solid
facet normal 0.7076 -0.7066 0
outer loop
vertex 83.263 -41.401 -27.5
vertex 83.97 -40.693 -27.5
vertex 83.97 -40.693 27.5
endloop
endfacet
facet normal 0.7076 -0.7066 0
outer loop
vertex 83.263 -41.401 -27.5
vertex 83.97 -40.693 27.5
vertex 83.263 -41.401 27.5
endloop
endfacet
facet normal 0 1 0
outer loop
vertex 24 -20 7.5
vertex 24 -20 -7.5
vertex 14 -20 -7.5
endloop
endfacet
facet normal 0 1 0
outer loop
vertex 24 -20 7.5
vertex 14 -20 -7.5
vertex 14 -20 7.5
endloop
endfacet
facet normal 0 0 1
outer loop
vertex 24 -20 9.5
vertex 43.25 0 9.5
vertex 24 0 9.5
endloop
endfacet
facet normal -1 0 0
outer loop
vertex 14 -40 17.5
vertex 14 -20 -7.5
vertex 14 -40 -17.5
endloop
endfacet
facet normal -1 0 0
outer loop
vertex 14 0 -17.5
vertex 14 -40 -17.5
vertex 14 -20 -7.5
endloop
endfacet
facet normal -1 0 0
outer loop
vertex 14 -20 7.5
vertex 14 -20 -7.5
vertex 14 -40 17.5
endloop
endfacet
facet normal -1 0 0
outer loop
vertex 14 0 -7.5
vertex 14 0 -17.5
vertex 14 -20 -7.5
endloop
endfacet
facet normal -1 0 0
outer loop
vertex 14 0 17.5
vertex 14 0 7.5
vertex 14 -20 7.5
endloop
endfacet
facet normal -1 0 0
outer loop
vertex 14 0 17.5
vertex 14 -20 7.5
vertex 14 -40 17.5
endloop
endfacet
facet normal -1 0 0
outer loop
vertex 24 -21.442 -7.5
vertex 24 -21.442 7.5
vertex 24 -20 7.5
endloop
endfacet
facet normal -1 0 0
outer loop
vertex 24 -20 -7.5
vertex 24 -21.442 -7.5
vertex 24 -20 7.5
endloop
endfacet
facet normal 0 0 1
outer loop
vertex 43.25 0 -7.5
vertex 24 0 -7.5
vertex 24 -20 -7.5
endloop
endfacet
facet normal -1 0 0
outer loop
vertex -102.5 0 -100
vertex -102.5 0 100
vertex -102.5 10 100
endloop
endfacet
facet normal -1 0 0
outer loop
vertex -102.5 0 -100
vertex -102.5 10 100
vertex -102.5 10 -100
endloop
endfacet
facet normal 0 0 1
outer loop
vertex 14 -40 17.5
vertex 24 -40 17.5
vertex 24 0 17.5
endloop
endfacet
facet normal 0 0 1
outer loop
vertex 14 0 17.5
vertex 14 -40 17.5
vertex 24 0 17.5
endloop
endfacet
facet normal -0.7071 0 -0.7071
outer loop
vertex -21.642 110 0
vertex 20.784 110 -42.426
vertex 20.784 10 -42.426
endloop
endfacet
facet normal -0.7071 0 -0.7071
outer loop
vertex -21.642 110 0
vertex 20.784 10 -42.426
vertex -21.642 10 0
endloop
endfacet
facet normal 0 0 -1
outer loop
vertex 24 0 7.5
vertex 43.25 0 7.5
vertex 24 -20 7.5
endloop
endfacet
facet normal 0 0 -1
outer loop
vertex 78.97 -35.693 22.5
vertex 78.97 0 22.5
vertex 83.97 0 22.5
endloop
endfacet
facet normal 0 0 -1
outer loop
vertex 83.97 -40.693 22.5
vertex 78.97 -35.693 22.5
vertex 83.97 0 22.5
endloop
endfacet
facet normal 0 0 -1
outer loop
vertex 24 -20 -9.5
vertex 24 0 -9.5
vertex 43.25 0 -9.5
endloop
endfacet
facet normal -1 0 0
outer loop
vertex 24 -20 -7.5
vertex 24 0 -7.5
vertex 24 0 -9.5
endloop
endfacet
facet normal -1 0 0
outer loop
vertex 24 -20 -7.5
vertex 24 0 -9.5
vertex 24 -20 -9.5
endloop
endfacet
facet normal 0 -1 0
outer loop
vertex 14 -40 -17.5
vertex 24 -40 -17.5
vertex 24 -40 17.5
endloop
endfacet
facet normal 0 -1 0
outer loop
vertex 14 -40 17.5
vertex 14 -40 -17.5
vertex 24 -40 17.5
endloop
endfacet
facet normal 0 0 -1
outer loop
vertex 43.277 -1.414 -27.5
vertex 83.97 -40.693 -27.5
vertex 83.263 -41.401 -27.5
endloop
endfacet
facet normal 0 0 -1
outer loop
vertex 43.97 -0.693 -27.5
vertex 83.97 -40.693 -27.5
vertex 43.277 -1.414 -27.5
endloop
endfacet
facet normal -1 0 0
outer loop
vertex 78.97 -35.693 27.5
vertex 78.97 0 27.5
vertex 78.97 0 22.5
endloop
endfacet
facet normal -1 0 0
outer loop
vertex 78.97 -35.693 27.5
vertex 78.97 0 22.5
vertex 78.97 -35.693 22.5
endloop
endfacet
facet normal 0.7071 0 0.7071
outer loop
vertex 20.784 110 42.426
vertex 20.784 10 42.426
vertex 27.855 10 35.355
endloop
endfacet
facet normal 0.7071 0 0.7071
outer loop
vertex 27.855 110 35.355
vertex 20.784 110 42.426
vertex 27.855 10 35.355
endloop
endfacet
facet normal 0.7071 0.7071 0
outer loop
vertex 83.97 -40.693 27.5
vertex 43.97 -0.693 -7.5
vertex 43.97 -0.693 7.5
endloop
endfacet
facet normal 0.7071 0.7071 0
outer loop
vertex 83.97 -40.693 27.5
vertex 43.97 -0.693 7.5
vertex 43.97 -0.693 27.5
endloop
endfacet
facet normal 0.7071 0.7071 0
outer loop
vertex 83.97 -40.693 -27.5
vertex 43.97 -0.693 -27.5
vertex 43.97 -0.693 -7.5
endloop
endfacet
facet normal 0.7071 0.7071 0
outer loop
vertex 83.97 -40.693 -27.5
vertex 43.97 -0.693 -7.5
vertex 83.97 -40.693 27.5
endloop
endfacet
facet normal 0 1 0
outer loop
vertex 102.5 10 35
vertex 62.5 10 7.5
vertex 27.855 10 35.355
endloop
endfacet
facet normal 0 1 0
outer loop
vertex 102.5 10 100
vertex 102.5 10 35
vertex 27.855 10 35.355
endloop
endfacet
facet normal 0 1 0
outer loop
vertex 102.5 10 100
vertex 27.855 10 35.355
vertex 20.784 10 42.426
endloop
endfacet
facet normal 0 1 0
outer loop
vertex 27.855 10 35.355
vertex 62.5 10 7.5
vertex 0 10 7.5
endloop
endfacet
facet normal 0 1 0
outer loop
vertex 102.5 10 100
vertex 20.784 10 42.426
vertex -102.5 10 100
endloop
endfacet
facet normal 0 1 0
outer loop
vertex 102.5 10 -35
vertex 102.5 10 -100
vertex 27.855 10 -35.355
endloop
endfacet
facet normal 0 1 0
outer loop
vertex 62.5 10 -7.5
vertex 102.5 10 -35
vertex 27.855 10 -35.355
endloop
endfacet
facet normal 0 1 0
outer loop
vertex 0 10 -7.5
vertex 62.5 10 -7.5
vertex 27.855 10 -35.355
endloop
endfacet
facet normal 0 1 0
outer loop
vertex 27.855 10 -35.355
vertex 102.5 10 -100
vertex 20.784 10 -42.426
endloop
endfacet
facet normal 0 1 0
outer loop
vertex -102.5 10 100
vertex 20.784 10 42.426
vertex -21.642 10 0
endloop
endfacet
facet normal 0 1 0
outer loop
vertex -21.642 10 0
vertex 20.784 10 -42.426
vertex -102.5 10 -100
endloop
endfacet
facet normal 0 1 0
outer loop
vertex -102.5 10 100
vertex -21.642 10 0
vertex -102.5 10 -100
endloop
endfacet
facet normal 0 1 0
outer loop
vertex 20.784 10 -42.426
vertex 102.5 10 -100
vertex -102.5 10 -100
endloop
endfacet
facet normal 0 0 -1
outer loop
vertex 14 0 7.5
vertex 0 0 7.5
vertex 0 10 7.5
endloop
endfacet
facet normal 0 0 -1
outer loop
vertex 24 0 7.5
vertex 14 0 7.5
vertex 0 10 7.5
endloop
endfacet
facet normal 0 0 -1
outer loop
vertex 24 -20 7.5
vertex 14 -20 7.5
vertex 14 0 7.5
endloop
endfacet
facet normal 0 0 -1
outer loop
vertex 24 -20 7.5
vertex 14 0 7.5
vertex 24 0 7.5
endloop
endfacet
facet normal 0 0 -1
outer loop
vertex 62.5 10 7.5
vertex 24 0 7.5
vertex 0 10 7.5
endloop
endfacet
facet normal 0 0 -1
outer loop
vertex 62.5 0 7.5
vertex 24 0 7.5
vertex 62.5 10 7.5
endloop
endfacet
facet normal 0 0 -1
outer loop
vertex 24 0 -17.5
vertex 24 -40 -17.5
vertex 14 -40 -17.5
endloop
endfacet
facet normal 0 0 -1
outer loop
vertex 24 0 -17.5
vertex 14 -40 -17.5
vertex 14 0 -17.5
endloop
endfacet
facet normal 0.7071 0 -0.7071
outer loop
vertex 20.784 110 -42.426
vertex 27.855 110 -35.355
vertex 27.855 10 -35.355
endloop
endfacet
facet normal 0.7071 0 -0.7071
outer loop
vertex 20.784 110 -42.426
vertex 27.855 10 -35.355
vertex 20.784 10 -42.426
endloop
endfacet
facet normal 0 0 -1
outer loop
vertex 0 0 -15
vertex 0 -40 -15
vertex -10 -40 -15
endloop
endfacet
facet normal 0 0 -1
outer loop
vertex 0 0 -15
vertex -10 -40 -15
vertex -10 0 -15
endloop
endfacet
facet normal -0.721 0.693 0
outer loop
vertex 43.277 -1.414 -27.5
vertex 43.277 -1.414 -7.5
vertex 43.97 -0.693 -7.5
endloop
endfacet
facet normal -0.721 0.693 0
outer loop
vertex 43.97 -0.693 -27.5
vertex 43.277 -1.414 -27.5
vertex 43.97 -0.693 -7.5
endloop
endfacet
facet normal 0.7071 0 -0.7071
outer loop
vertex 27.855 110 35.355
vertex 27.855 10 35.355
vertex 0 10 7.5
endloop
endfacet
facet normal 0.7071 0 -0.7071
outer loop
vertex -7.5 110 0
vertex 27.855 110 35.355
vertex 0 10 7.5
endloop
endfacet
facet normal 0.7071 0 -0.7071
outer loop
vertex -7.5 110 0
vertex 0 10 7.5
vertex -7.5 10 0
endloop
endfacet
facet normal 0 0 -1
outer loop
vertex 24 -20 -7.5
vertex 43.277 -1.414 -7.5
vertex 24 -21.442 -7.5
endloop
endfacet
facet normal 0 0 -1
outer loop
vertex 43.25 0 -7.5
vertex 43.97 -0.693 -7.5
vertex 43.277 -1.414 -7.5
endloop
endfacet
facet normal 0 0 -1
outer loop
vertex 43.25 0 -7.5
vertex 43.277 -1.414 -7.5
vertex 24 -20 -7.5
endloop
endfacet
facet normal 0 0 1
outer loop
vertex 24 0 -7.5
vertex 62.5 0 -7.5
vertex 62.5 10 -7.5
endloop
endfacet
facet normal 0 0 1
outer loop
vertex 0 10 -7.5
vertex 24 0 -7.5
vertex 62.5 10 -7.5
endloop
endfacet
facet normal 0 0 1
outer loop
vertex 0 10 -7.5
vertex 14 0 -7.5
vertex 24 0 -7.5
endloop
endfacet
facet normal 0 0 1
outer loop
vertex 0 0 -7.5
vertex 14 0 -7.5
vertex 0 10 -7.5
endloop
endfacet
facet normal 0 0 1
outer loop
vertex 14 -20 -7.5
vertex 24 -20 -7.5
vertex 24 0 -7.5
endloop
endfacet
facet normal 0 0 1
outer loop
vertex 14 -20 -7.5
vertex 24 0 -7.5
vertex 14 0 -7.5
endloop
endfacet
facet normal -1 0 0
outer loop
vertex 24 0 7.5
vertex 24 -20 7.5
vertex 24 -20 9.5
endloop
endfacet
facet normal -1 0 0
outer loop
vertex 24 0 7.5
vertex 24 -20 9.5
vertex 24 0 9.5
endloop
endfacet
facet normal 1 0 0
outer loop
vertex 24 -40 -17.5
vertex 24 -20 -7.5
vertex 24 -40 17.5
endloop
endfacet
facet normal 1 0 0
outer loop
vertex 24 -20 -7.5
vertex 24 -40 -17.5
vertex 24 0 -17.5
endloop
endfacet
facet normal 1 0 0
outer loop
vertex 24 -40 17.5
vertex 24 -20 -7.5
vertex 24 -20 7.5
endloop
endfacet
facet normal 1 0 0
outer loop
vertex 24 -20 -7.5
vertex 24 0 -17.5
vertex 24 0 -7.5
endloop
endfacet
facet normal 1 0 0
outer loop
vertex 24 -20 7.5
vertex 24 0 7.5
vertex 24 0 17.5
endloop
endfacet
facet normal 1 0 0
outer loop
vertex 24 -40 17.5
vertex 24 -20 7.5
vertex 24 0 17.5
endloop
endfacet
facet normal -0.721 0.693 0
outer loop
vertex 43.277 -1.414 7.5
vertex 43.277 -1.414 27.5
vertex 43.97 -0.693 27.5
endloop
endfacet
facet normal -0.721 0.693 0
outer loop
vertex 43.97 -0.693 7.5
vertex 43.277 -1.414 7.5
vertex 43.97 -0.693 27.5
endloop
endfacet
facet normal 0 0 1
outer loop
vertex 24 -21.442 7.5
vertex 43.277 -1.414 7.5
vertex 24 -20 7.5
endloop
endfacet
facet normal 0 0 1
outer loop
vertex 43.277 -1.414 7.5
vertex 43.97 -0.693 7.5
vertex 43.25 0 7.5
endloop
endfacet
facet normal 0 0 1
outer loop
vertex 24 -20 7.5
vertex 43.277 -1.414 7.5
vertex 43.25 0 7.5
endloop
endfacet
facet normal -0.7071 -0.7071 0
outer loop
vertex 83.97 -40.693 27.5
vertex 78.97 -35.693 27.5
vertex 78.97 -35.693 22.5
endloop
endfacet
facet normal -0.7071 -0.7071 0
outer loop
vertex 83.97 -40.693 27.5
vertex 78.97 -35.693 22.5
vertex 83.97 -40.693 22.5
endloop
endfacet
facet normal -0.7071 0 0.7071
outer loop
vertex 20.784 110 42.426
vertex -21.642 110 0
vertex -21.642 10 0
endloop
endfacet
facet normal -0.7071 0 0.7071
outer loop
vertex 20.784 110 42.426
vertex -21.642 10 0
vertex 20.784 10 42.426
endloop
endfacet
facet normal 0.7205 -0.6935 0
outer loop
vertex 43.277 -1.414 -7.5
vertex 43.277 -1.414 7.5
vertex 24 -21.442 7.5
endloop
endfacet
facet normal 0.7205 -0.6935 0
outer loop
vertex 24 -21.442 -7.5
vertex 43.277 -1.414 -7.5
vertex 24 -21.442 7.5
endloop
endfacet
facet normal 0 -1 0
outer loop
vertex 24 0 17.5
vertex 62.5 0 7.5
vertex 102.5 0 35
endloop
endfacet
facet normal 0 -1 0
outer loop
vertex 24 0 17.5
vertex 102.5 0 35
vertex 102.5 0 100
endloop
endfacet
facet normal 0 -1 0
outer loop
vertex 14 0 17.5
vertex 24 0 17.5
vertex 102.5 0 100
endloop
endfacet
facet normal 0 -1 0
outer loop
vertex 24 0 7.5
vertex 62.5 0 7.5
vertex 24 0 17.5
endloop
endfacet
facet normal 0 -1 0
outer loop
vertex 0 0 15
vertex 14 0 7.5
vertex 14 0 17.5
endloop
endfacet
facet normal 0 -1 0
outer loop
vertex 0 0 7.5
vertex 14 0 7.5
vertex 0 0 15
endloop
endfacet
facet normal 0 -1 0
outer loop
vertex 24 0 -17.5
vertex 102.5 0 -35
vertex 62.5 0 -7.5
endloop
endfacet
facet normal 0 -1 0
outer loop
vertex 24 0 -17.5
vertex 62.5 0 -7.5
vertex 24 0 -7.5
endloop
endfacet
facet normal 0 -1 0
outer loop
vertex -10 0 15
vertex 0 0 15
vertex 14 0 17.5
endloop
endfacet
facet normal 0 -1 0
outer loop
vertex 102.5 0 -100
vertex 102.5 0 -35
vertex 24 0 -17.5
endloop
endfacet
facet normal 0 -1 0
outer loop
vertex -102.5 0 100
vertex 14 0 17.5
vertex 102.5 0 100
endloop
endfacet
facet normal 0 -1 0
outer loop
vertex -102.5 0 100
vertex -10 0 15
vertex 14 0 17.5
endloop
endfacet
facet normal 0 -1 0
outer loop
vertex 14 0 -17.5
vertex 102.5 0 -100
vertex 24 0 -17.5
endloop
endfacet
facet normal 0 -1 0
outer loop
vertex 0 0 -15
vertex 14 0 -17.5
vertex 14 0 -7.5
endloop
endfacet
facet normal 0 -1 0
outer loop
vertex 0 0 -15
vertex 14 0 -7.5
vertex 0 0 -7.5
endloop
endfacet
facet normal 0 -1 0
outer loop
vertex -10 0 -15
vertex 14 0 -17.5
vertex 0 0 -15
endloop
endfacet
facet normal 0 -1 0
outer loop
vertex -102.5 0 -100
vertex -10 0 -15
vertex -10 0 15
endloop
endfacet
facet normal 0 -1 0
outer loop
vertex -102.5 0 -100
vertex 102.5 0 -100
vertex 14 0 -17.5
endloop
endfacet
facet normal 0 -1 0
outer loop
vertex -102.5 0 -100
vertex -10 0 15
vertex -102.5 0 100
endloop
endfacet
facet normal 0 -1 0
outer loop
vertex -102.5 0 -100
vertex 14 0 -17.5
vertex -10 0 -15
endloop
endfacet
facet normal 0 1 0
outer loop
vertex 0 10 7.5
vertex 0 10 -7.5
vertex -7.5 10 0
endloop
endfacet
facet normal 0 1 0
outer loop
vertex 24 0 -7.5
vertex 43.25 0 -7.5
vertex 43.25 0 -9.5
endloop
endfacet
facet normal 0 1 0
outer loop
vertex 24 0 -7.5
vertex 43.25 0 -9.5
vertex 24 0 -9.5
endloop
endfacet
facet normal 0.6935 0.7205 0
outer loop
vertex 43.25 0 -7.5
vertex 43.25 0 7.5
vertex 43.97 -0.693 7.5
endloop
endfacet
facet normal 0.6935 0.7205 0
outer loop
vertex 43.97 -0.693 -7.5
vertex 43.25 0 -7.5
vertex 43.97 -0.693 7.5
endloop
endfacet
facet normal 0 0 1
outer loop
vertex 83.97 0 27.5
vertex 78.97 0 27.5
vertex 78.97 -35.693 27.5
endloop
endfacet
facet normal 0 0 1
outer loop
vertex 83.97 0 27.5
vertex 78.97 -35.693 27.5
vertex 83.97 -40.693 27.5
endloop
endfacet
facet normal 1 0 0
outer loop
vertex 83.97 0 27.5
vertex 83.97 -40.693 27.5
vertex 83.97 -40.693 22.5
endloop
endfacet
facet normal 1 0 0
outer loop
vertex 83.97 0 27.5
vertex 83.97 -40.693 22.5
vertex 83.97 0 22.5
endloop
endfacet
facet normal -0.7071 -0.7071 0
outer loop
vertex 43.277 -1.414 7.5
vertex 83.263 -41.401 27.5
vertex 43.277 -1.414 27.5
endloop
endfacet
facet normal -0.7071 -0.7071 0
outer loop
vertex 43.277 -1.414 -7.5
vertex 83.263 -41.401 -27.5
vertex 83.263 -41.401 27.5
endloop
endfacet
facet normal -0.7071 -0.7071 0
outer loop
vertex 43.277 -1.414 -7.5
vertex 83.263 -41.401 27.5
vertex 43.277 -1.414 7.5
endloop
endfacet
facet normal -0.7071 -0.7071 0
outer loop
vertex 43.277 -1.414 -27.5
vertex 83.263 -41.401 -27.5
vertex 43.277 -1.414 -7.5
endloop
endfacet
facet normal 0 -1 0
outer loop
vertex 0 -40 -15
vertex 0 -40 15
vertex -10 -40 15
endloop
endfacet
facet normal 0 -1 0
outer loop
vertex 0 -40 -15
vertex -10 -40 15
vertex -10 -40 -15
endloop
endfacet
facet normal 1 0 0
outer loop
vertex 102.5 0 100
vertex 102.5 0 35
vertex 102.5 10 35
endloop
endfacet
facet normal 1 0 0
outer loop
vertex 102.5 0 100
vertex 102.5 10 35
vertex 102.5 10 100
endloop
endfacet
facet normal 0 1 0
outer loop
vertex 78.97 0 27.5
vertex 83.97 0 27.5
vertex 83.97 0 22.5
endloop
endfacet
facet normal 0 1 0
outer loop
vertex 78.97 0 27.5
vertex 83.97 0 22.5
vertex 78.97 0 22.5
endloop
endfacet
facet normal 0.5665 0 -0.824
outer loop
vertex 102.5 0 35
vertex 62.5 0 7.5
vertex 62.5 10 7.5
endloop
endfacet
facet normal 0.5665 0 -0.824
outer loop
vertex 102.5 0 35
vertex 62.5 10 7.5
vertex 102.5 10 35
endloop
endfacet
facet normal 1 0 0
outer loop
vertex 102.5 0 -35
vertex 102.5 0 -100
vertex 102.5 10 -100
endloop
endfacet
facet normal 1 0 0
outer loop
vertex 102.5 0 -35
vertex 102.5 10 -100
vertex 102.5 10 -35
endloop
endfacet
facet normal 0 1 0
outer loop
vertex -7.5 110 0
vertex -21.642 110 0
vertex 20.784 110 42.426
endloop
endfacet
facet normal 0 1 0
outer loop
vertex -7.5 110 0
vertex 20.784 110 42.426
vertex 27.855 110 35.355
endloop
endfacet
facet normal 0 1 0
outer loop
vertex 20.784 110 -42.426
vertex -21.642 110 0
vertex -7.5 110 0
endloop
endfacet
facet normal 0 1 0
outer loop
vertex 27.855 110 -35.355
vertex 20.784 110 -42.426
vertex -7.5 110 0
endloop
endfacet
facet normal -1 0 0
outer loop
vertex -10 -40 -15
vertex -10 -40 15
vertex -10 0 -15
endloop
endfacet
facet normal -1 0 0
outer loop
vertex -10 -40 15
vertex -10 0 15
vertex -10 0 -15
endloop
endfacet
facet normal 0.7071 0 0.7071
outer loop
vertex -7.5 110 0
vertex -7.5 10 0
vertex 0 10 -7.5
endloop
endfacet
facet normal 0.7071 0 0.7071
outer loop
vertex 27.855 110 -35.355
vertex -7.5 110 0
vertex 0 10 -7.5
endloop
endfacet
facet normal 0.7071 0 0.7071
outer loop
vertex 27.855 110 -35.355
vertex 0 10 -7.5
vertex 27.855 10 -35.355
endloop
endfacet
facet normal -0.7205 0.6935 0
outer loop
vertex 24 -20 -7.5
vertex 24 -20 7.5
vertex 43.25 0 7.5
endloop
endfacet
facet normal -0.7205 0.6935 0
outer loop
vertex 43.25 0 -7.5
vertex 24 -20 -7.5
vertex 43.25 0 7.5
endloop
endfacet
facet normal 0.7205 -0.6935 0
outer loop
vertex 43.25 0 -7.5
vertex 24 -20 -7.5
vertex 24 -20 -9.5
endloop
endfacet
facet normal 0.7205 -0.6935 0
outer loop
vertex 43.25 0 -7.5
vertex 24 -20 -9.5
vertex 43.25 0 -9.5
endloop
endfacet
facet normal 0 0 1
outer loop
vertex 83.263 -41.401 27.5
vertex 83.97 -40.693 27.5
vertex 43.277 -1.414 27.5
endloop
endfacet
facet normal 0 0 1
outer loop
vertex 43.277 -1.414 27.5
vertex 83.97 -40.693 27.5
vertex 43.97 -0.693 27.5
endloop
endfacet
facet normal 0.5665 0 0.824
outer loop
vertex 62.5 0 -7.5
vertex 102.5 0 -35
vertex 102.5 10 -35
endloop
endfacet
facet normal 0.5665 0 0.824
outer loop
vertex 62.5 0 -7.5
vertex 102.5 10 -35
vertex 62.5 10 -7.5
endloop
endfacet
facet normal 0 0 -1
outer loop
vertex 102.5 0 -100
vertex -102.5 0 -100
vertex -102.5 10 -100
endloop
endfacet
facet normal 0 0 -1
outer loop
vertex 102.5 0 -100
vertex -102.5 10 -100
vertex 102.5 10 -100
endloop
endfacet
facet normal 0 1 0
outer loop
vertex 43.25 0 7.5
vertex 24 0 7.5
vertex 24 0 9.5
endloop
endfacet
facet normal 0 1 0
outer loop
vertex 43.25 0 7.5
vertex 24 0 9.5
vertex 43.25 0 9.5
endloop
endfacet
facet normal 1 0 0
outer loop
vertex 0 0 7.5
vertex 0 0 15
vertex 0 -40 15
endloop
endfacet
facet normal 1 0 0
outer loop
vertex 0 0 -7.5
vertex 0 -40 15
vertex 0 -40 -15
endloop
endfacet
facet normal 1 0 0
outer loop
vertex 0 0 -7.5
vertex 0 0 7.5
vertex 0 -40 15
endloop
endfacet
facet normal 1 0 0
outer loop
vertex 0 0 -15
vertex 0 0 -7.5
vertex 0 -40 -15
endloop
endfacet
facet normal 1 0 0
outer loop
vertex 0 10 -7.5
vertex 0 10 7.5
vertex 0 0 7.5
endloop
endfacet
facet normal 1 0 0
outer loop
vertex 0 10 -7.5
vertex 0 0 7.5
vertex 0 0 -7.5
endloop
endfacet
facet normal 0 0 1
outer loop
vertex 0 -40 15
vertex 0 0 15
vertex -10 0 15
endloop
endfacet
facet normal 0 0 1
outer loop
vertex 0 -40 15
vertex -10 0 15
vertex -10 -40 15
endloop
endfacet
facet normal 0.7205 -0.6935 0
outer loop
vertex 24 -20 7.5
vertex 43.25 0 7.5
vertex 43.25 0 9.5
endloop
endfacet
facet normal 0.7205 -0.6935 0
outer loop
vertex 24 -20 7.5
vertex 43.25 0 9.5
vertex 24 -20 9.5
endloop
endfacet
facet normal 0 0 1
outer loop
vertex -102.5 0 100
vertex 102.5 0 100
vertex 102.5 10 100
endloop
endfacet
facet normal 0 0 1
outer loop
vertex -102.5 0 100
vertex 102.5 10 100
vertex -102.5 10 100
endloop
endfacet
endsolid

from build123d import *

# Parameters (mm, degrees)
BOSS_EXTRUDE1_DEPTH       = 10
BOSS_EXTRUDE2_DEPTH       = 110
BOSS_EXTRUDE3_DEPTH       = 10
SKETCH6_W                 = 10
SKETCH6_H                 = 10
BOSS_EXTRUDE4_DEPTH       = 20
SKETCH7_W                 = 35
SKETCH7_H                 = 20
BOSS_EXTRUDE6_DEPTH       = 10
BOSS_EXTRUDE8_DEPTH       = 15
BOSS_EXTRUDE10_DEPTH      = 2
BOSS_EXTRUDE12_DEPTH      = 2
BOSS_EXTRUDE13_DEPTH      = 20
BOSS_EXTRUDE13_DEPTH_BACK = 35
BOSS_EXTRUDE15_DEPTH      = 5


with BuildPart() as part:
    # Sketch1 → Boss-Extrude1 (new body)
    with BuildSketch(Plane(origin=(0, 0, 0), x_dir=(1, 0, 0), z_dir=(0, 1, 0))):
        Polygon((102.5, -35), (102.5, -100), (-102.5, -100), (-102.5, 100), (102.5, 100), (102.5, 35), (62.5, 7.5), (0, 7.5), (0, -7.5), (62.5, -7.5), align=None)
    extrude(amount=BOSS_EXTRUDE1_DEPTH)

    # Sketch2 → Boss-Extrude2 (add)
    with BuildSketch(Plane(origin=(0, 0, 0), x_dir=(1, 0, 0), z_dir=(0, 1, 0))):
        Polygon((-7.5, 0), (0, 7.5), (27.855339059, 35.355339059), (20.784271247, 42.426406871), (-14.571067812, 7.071067812), (-21.642135624, 0), (-14.571067812, -7.071067812), (20.784271247, -42.426406871), (27.855339059, -35.355339059), align=None)
    extrude(amount=BOSS_EXTRUDE2_DEPTH)

    # Sketch4 → Boss-Extrude3 (add)
    with BuildSketch(Plane(origin=(0, 0, 0), x_dir=(0, 0, -1), z_dir=(1, 0, 0))):
        Polygon((-15, -40), (-7.5, -40), (7.5, -40), (15, -40), (15, 0), (-15, 0), align=None)
    extrude(amount=-BOSS_EXTRUDE3_DEPTH)

    # Sketch6 → Boss-Extrude4 (add)
    with BuildSketch(Plane(origin=(0, 0, 0), x_dir=(1, 0, 0), z_dir=(0, 1, 0))):
        with Locations((19, -12.5)):
            Rectangle(SKETCH6_W, SKETCH6_H)
        Polygon((14, 17.5), (14, 15), (14, 7.5), (24, 7.5), (24, 17.5), align=None)
    extrude(amount=-BOSS_EXTRUDE4_DEPTH)

    # Sketch7 → Boss-Extrude6 (add)
    with BuildSketch(Plane.ZY.offset(-24)):
        with Locations((0, -30)):
            Rectangle(SKETCH7_W, SKETCH7_H)
    extrude(amount=BOSS_EXTRUDE6_DEPTH)


with BuildPart() as body_2:
    # Sketch13 → Boss-Extrude8 (new body)
    with BuildSketch(Plane.XY.offset(7.5)):
        Polygon((24, -20), (43.25, 0), (43.970486853, -0.693468596), (24, -21.442026366), align=None)
    extrude(amount=-BOSS_EXTRUDE8_DEPTH)

    # Sketch19 → Boss-Extrude13 (add, two sides: drawn at the far end of the back side and taken through both)
    with BuildSketch(Plane.XY.offset(7.5).offset(-BOSS_EXTRUDE13_DEPTH_BACK)):
        Polygon((43.276891667, -1.414086972), (43.970486853, -0.693468596), (83.970486853, -40.693468596), (83.263380072, -41.400575378), align=None)
    extrude(amount=BOSS_EXTRUDE13_DEPTH + BOSS_EXTRUDE13_DEPTH_BACK)


with BuildPart() as body_3:
    # Sketch15 → Boss-Extrude10 (new body)
    with BuildSketch(Plane.XY.offset(7.5)):
        Polygon((24, -20), (24, 0), (43.25, 0), align=None)
    extrude(amount=BOSS_EXTRUDE10_DEPTH)


with BuildPart() as body_4:
    # Sketch16 → Boss-Extrude12 (new body)
    with BuildSketch(Plane.XY.offset(-7.5)):
        Polygon((24, 0), (24, -20), (43.25, 0), align=None)
    extrude(amount=-BOSS_EXTRUDE12_DEPTH)


with BuildPart() as body_5:
    # Sketch20 → Boss-Extrude15 (new body)
    with BuildSketch(Plane.XY.offset(27.5)):
        Polygon((83.970486853, -40.693468596), (83.970486853, 0), (78.970486853, 0), (78.970486853, -35.693468596), align=None)
    extrude(amount=-BOSS_EXTRUDE15_DEPTH)


solid = Compound([part.part, body_2.part, body_3.part, body_4.part, body_5.part])
